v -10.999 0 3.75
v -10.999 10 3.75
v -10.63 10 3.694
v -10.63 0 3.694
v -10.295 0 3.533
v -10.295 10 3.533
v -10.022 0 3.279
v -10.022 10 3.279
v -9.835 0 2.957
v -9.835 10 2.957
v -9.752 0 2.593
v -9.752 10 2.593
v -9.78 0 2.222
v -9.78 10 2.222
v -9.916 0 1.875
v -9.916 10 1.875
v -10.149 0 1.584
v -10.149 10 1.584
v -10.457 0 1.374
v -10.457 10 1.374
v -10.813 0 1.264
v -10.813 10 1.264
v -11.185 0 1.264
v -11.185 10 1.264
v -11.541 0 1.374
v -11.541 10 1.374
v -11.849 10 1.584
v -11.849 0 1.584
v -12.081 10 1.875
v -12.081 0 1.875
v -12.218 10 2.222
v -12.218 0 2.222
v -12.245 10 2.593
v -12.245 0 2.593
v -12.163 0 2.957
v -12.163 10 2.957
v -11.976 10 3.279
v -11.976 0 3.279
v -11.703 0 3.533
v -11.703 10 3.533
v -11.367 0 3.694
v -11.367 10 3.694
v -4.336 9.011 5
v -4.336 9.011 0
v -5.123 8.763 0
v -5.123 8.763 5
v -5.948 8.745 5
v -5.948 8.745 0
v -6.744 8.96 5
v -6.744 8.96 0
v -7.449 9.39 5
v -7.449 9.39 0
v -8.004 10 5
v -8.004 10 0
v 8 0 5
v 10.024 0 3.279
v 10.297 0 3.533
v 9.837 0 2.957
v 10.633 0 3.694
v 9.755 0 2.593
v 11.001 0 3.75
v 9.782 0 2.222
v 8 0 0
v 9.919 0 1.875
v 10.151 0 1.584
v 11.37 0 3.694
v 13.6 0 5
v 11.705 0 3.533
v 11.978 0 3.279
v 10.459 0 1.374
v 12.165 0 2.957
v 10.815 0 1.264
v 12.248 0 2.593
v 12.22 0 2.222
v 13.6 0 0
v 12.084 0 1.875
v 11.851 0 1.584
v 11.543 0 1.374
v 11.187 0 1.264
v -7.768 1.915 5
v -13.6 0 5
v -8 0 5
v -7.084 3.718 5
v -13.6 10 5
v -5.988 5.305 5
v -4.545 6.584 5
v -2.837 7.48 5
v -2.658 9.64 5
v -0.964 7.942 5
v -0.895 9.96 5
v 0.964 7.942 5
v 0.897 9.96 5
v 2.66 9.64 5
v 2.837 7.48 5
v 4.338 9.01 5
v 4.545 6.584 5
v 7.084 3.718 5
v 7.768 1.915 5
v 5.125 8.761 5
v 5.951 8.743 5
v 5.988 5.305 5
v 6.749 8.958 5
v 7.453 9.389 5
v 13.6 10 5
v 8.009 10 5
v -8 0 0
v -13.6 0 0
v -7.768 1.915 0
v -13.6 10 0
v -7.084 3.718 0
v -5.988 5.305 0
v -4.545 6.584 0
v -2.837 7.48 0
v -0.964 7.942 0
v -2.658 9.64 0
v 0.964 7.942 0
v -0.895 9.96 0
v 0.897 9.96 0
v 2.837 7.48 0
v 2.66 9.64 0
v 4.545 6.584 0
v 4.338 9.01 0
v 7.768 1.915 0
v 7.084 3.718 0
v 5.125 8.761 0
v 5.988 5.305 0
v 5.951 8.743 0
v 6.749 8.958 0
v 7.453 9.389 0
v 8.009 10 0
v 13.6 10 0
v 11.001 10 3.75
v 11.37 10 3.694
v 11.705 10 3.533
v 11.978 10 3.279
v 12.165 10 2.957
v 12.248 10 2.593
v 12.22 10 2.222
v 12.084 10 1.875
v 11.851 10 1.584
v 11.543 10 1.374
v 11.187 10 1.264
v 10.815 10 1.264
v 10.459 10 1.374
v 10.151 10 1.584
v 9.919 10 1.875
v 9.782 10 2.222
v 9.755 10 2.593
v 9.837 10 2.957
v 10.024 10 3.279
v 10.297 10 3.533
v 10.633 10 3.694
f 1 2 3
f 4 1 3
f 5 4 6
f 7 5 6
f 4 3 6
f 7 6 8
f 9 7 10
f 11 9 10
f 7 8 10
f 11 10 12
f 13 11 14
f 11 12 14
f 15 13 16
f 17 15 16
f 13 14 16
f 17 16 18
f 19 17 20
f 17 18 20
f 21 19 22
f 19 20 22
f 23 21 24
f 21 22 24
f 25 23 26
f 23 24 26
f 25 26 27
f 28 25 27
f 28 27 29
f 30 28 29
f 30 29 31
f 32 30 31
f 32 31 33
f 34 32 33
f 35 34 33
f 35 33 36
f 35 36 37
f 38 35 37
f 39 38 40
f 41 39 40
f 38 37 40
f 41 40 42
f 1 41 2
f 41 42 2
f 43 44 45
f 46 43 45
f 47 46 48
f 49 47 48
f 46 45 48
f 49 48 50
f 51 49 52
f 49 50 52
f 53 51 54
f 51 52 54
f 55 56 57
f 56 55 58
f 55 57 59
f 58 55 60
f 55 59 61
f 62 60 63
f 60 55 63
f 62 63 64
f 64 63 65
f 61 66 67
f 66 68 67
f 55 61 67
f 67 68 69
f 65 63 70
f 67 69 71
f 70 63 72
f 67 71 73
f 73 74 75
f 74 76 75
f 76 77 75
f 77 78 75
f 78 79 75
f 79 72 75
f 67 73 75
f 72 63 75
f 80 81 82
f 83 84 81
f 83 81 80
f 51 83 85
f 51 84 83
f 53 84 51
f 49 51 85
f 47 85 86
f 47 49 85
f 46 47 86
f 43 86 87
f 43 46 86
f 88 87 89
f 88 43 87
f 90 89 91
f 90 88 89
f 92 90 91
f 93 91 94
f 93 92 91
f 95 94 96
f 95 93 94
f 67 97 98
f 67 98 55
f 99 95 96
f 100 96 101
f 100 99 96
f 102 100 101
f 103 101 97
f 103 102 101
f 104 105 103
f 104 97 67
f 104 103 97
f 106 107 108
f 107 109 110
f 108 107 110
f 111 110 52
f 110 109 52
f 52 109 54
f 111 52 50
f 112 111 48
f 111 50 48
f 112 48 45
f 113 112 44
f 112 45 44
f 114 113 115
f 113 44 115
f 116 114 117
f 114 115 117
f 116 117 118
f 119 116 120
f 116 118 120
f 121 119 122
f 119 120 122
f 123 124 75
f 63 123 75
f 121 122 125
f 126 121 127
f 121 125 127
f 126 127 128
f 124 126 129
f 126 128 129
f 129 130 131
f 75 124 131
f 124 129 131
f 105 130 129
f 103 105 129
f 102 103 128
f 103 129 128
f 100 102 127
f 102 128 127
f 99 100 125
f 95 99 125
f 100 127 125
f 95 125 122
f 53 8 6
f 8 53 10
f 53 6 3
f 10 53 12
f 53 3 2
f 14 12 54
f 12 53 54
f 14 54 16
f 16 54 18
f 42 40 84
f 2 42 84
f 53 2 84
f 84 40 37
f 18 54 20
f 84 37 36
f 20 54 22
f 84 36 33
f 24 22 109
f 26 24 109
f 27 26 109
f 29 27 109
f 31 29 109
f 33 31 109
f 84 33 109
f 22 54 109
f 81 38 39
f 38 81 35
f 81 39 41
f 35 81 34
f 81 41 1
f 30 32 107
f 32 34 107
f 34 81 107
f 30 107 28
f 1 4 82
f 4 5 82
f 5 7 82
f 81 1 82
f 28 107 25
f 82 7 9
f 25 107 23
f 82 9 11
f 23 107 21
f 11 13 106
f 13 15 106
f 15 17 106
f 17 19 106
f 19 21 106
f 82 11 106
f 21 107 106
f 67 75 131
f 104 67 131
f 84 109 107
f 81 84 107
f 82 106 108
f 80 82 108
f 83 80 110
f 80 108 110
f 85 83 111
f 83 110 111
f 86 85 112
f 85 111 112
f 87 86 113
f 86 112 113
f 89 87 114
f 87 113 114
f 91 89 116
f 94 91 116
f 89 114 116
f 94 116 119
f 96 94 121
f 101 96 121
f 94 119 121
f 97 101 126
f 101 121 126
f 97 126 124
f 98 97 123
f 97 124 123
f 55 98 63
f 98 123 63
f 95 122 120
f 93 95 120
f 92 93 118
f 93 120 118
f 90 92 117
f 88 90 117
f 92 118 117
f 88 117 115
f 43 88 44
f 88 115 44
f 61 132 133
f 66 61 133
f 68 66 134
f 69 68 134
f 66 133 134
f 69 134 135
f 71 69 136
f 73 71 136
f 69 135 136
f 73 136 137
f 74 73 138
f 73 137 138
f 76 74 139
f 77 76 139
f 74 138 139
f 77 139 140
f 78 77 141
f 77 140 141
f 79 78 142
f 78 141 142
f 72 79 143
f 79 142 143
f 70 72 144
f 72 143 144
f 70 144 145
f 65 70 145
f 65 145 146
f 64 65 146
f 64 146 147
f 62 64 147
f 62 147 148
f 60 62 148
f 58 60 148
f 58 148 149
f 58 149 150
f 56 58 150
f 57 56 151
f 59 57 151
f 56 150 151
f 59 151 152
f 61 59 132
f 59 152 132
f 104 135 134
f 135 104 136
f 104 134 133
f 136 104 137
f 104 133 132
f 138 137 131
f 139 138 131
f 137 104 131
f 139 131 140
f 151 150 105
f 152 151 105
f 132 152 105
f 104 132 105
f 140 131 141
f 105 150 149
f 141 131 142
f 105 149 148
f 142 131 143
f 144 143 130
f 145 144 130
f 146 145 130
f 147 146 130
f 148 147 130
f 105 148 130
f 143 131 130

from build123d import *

# Parameters (mm, degrees)
BOSS_EXTRUDE1_DEPTH = 5
SKETCH3_R           = 1.25
CUT_EXTRUDE1_DEPTH  = 10


with BuildPart() as part:
    # Sketch2 → Boss-Extrude1 (new body)
    with BuildSketch(Plane.XY):
        with BuildLine():
            ThreePointArc((-8, 0), (0, 8), (8, 0))
            Line((8, 0), (13.6, 0))
            Line((13.6, 0), (13.6, 10))
            Line((13.6, 10), (8.008871246, 10))
            ThreePointArc((8.008871246, 10), (6.357463889, 8.822466805), (4.337930538, 9.01012534))
            ThreePointArc((4.337930538, 9.01012534), (0.001186479, 9.99999993), (-4.335792351, 9.011154459))
            ThreePointArc((-4.335792351, 9.011154459), (-6.353531515, 8.82385013), (-8.003690819, 10))
            Line((-8.003690819, 10), (-13.6, 10))
            Line((-13.6, 10), (-13.6, 0))
            Line((-13.6, 0), (-8, 0))
        make_face()
    extrude(amount=BOSS_EXTRUDE1_DEPTH)

    # Sketch3 → Cut-Extrude1 (cut)
    with BuildSketch(Plane(origin=(0, 10, 0), x_dir=(1, 0, 0), z_dir=(0, 1, 0))):
        with Locations(Location((-10.998930891, -2.5, 0), (0, 0, 270))):
            Circle(SKETCH3_R)
        with Locations(Location((11.001069109, -2.5, 0), (0, 0, 270))):
            Circle(SKETCH3_R)
    extrude(amount=-CUT_EXTRUDE1_DEPTH, mode=Mode.SUBTRACT)


solid = part.part
